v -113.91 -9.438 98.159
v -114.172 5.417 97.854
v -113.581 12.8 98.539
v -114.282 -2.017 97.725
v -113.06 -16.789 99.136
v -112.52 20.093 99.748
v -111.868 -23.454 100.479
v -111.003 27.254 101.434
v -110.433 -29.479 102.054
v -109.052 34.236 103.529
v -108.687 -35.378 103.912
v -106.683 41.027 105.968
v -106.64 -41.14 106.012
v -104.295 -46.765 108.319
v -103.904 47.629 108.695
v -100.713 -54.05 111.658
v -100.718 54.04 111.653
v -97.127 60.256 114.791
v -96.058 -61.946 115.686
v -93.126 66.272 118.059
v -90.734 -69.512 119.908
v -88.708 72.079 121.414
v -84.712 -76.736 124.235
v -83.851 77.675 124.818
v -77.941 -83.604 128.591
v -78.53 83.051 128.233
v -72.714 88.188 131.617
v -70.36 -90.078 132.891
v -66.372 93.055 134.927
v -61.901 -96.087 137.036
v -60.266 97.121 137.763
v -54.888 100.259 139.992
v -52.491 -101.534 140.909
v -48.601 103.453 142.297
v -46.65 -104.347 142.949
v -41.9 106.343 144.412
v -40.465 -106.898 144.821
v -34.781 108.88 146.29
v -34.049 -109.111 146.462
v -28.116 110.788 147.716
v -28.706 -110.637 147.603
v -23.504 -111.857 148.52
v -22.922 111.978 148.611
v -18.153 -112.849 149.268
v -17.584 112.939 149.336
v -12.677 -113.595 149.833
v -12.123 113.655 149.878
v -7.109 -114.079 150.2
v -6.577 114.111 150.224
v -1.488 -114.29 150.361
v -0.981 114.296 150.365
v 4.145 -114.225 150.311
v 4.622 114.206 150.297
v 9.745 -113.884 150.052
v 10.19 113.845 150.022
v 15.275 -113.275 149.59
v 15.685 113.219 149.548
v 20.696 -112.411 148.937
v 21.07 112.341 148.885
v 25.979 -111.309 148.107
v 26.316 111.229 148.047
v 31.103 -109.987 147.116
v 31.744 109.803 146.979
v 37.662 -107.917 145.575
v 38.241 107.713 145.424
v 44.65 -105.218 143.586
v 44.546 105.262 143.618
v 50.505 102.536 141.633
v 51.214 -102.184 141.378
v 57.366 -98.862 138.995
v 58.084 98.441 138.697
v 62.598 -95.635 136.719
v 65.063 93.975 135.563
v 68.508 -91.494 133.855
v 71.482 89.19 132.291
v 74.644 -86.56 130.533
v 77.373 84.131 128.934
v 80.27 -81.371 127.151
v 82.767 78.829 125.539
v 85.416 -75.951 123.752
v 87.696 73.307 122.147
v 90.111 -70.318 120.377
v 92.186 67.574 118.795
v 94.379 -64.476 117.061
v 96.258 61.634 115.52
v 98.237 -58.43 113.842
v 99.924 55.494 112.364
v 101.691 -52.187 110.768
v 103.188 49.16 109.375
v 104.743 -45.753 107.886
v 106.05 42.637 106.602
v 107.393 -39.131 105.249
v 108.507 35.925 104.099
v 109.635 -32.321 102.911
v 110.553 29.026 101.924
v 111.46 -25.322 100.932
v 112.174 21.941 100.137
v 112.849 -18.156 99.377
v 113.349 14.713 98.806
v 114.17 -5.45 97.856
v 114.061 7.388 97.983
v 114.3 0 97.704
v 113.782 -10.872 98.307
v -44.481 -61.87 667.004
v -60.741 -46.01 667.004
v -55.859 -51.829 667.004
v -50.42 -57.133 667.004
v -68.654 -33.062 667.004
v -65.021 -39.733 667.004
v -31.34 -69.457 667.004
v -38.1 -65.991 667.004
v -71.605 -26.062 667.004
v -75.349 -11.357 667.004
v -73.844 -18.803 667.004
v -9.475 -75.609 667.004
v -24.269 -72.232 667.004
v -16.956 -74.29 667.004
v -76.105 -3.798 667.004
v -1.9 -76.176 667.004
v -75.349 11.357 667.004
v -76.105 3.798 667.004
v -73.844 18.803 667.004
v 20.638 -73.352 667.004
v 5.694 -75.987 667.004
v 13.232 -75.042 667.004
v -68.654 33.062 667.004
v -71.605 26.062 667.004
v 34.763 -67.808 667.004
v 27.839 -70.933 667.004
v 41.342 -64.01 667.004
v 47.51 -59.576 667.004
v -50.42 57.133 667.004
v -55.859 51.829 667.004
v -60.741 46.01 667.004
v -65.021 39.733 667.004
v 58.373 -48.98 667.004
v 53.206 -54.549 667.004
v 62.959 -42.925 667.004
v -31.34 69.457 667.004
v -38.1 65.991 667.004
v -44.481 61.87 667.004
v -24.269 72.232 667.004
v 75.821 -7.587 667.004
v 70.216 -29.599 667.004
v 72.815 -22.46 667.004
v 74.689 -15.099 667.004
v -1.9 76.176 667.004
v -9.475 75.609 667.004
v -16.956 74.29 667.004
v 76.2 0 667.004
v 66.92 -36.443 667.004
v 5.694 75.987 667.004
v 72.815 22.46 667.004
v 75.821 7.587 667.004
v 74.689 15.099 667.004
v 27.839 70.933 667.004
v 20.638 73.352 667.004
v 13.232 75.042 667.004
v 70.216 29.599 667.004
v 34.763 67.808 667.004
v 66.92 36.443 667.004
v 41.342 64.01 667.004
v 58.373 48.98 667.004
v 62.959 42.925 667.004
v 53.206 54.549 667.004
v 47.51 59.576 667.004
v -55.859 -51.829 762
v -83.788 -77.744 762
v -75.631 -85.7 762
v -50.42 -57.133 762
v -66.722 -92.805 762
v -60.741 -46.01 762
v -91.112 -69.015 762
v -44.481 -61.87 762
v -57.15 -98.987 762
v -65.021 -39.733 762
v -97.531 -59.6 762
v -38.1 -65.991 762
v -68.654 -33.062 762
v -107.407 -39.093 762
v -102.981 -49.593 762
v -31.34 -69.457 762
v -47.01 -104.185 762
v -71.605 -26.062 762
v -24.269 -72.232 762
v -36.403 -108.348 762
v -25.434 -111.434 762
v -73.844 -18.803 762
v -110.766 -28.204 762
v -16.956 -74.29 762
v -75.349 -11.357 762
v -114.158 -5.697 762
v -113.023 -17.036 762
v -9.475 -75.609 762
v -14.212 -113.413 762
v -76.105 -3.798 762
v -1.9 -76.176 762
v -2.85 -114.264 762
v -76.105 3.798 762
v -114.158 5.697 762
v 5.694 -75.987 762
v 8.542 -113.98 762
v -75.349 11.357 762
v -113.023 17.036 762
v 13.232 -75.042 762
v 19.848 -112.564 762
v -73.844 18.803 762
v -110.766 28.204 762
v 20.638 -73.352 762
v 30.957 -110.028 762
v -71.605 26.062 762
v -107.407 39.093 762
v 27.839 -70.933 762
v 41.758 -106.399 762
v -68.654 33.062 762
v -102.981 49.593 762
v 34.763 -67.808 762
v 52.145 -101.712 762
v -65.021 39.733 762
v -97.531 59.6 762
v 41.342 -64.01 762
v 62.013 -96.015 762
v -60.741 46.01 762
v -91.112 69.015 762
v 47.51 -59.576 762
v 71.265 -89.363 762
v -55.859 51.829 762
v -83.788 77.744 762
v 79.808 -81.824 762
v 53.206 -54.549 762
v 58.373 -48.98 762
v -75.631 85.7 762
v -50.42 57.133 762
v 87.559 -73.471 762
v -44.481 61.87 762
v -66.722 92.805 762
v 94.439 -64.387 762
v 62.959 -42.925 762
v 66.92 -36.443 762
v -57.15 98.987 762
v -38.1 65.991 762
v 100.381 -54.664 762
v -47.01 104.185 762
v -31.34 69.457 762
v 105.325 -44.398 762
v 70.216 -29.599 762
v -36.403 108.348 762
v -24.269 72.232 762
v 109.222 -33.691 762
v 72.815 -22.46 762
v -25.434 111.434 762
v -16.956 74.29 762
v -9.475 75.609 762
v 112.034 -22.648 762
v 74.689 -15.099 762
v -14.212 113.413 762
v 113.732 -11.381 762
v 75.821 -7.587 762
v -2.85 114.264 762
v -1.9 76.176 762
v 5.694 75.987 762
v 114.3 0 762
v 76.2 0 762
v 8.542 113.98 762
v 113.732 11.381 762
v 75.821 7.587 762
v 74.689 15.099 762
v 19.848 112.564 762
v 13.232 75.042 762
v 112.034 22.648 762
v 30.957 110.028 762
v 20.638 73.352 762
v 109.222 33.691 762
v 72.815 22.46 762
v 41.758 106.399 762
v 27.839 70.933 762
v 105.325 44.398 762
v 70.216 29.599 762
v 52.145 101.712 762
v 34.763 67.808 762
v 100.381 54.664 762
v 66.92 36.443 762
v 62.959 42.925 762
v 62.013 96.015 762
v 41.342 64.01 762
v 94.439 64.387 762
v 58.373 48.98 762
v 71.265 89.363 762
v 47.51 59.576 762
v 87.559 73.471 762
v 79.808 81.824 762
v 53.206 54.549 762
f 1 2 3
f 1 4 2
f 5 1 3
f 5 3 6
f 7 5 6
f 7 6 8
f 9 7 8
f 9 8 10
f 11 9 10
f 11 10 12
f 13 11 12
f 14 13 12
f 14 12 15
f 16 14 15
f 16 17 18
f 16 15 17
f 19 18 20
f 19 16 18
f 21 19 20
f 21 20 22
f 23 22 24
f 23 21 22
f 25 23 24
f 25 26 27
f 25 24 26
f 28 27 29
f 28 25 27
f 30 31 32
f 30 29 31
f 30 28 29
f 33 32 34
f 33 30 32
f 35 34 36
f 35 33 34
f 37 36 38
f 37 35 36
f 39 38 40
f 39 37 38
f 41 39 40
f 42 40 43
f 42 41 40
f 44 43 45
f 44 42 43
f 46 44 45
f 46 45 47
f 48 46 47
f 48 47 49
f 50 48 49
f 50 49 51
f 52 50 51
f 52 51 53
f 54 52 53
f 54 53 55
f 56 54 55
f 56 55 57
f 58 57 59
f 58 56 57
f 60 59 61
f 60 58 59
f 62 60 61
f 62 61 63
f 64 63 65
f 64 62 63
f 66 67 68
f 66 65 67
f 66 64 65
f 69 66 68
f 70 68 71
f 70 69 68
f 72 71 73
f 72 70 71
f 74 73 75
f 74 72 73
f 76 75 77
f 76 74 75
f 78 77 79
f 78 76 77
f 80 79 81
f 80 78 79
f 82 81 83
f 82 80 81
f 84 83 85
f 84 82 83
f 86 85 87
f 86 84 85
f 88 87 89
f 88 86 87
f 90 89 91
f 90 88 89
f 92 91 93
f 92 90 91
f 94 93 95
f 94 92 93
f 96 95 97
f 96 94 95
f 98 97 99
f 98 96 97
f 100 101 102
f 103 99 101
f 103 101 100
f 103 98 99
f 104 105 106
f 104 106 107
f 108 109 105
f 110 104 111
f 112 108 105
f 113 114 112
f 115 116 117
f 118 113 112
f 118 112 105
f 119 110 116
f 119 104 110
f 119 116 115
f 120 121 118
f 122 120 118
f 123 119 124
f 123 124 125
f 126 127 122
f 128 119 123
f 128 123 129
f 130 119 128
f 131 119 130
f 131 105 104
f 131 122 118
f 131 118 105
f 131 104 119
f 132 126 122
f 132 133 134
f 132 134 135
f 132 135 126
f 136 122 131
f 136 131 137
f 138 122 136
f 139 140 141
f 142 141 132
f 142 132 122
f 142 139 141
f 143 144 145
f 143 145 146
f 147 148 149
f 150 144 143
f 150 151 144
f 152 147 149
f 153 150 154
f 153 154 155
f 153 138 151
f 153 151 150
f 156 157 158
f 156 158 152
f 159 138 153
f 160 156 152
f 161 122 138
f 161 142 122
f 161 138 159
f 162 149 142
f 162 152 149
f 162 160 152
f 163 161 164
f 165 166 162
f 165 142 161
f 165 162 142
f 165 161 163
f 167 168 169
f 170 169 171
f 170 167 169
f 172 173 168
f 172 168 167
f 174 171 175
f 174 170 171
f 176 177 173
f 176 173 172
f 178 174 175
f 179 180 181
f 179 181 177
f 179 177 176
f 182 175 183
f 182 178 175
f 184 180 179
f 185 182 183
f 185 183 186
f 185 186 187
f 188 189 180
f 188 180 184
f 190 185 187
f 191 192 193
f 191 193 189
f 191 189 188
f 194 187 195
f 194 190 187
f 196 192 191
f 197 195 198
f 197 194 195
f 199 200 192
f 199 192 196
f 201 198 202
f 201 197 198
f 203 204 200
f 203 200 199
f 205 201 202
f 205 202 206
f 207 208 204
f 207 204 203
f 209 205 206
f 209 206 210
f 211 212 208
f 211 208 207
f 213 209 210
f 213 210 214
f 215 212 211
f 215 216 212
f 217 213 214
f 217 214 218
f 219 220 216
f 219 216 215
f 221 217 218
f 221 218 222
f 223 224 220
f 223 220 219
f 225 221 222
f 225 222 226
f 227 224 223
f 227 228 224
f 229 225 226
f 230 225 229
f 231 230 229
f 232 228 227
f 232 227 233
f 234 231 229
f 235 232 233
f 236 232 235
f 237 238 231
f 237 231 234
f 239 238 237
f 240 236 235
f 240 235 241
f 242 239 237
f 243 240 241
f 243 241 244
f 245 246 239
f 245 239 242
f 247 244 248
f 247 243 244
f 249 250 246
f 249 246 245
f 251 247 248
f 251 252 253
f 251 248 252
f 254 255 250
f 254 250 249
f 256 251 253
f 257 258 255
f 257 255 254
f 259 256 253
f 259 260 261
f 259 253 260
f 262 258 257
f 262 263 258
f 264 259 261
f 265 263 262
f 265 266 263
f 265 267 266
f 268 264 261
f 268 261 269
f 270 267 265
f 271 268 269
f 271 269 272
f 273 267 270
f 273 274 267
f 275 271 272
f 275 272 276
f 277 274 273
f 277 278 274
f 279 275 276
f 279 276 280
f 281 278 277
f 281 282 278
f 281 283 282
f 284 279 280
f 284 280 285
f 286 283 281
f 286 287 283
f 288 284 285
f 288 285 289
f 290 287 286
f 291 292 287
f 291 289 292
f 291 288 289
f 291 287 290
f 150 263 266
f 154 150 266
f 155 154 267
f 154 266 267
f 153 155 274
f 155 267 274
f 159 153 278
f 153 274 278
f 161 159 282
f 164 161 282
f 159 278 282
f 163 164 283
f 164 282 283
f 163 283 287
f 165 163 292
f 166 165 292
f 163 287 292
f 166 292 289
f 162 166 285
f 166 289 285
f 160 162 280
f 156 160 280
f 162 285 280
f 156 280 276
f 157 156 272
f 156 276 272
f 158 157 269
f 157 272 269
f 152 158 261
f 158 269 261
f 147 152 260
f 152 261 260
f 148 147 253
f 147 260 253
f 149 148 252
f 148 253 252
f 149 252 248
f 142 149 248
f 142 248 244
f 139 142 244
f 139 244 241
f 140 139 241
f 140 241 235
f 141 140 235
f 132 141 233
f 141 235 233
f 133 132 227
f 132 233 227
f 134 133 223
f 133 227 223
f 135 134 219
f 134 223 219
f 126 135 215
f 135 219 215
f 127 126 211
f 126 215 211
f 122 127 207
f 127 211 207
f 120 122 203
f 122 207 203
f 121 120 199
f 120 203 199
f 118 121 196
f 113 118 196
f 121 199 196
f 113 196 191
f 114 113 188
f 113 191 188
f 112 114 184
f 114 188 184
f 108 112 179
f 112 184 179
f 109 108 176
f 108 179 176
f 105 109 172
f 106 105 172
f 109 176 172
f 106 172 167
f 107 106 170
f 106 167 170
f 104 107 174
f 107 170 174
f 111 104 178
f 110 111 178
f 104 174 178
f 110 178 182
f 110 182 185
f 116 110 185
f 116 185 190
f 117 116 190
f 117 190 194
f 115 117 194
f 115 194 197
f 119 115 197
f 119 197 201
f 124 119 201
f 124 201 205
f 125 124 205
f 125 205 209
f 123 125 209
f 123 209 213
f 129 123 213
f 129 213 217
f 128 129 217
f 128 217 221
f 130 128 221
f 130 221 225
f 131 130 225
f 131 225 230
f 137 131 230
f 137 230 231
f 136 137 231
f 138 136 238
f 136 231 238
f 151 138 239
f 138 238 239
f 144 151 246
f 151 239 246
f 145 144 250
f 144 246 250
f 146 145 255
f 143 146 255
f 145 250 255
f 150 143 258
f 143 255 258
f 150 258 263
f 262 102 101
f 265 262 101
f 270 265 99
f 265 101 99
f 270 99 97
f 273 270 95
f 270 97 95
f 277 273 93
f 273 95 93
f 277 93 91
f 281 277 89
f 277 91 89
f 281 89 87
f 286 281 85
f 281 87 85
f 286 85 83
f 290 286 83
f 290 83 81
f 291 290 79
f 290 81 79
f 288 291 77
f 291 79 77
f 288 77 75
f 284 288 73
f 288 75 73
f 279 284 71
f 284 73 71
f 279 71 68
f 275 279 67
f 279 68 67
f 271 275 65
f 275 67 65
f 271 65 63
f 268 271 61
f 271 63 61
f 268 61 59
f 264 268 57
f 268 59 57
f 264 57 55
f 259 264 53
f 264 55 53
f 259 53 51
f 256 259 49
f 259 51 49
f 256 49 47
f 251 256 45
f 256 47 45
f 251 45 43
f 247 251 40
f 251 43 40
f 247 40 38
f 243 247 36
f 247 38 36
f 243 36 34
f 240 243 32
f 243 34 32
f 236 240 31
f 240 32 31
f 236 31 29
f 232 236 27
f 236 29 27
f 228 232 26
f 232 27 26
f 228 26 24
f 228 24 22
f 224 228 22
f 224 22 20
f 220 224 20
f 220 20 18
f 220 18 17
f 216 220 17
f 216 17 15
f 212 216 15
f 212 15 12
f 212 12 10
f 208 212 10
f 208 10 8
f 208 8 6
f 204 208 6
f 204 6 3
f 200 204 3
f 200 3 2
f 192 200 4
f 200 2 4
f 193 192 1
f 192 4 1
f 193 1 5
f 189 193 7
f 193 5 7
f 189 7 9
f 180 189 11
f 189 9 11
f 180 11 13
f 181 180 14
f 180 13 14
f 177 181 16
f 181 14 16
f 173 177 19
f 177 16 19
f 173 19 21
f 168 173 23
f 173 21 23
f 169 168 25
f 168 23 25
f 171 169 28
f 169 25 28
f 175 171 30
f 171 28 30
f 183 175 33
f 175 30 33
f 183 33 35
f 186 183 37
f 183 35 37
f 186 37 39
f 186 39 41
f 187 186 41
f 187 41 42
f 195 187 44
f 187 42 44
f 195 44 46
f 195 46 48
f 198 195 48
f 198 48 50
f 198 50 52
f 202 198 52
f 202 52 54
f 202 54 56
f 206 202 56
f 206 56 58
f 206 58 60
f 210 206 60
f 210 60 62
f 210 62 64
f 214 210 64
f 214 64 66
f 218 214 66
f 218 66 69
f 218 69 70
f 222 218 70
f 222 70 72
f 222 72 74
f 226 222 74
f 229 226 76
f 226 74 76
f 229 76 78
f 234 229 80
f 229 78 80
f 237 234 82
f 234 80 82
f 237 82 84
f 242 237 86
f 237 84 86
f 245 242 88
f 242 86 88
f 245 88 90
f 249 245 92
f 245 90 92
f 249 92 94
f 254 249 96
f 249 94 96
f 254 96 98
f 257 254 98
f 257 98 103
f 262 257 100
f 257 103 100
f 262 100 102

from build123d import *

# Parameters (mm, degrees)
SKETCH1_R               = 114.3
BOSS_EXTRUDE1_DEPTH     = 762
SKETCH2_R               = 76.2
CUT_EXTRUDE1_DEPTH      = 94.996
CUT_EXTRUDE2_DEPTH      = 241.046
CUT_EXTRUDE2_DEPTH_BACK = 276.352
SKETCH6_R               = 150.368


with BuildPart() as part:
    # Sketch1 → Boss-Extrude1 (new body)
    with BuildSketch(Plane.XY):
        Circle(SKETCH1_R)
    extrude(amount=BOSS_EXTRUDE1_DEPTH)

    # Sketch2 → Cut-Extrude1 (cut)
    with BuildSketch(Plane.XY.offset(762)):
        Circle(SKETCH2_R)
    extrude(amount=-CUT_EXTRUDE1_DEPTH, mode=Mode.SUBTRACT)

    # Sketch6 → Cut-Extrude2 (cut, two sides: drawn at the far end of the back side and taken through both)
    with BuildSketch(Plane(origin=(0, 0, 0), x_dir=(1, 0, 0), z_dir=(0, 1, 0)).offset(-CUT_EXTRUDE2_DEPTH_BACK)):
        Circle(SKETCH6_R)
    extrude(amount=CUT_EXTRUDE2_DEPTH + CUT_EXTRUDE2_DEPTH_BACK, mode=Mode.SUBTRACT)


solid = part.part
